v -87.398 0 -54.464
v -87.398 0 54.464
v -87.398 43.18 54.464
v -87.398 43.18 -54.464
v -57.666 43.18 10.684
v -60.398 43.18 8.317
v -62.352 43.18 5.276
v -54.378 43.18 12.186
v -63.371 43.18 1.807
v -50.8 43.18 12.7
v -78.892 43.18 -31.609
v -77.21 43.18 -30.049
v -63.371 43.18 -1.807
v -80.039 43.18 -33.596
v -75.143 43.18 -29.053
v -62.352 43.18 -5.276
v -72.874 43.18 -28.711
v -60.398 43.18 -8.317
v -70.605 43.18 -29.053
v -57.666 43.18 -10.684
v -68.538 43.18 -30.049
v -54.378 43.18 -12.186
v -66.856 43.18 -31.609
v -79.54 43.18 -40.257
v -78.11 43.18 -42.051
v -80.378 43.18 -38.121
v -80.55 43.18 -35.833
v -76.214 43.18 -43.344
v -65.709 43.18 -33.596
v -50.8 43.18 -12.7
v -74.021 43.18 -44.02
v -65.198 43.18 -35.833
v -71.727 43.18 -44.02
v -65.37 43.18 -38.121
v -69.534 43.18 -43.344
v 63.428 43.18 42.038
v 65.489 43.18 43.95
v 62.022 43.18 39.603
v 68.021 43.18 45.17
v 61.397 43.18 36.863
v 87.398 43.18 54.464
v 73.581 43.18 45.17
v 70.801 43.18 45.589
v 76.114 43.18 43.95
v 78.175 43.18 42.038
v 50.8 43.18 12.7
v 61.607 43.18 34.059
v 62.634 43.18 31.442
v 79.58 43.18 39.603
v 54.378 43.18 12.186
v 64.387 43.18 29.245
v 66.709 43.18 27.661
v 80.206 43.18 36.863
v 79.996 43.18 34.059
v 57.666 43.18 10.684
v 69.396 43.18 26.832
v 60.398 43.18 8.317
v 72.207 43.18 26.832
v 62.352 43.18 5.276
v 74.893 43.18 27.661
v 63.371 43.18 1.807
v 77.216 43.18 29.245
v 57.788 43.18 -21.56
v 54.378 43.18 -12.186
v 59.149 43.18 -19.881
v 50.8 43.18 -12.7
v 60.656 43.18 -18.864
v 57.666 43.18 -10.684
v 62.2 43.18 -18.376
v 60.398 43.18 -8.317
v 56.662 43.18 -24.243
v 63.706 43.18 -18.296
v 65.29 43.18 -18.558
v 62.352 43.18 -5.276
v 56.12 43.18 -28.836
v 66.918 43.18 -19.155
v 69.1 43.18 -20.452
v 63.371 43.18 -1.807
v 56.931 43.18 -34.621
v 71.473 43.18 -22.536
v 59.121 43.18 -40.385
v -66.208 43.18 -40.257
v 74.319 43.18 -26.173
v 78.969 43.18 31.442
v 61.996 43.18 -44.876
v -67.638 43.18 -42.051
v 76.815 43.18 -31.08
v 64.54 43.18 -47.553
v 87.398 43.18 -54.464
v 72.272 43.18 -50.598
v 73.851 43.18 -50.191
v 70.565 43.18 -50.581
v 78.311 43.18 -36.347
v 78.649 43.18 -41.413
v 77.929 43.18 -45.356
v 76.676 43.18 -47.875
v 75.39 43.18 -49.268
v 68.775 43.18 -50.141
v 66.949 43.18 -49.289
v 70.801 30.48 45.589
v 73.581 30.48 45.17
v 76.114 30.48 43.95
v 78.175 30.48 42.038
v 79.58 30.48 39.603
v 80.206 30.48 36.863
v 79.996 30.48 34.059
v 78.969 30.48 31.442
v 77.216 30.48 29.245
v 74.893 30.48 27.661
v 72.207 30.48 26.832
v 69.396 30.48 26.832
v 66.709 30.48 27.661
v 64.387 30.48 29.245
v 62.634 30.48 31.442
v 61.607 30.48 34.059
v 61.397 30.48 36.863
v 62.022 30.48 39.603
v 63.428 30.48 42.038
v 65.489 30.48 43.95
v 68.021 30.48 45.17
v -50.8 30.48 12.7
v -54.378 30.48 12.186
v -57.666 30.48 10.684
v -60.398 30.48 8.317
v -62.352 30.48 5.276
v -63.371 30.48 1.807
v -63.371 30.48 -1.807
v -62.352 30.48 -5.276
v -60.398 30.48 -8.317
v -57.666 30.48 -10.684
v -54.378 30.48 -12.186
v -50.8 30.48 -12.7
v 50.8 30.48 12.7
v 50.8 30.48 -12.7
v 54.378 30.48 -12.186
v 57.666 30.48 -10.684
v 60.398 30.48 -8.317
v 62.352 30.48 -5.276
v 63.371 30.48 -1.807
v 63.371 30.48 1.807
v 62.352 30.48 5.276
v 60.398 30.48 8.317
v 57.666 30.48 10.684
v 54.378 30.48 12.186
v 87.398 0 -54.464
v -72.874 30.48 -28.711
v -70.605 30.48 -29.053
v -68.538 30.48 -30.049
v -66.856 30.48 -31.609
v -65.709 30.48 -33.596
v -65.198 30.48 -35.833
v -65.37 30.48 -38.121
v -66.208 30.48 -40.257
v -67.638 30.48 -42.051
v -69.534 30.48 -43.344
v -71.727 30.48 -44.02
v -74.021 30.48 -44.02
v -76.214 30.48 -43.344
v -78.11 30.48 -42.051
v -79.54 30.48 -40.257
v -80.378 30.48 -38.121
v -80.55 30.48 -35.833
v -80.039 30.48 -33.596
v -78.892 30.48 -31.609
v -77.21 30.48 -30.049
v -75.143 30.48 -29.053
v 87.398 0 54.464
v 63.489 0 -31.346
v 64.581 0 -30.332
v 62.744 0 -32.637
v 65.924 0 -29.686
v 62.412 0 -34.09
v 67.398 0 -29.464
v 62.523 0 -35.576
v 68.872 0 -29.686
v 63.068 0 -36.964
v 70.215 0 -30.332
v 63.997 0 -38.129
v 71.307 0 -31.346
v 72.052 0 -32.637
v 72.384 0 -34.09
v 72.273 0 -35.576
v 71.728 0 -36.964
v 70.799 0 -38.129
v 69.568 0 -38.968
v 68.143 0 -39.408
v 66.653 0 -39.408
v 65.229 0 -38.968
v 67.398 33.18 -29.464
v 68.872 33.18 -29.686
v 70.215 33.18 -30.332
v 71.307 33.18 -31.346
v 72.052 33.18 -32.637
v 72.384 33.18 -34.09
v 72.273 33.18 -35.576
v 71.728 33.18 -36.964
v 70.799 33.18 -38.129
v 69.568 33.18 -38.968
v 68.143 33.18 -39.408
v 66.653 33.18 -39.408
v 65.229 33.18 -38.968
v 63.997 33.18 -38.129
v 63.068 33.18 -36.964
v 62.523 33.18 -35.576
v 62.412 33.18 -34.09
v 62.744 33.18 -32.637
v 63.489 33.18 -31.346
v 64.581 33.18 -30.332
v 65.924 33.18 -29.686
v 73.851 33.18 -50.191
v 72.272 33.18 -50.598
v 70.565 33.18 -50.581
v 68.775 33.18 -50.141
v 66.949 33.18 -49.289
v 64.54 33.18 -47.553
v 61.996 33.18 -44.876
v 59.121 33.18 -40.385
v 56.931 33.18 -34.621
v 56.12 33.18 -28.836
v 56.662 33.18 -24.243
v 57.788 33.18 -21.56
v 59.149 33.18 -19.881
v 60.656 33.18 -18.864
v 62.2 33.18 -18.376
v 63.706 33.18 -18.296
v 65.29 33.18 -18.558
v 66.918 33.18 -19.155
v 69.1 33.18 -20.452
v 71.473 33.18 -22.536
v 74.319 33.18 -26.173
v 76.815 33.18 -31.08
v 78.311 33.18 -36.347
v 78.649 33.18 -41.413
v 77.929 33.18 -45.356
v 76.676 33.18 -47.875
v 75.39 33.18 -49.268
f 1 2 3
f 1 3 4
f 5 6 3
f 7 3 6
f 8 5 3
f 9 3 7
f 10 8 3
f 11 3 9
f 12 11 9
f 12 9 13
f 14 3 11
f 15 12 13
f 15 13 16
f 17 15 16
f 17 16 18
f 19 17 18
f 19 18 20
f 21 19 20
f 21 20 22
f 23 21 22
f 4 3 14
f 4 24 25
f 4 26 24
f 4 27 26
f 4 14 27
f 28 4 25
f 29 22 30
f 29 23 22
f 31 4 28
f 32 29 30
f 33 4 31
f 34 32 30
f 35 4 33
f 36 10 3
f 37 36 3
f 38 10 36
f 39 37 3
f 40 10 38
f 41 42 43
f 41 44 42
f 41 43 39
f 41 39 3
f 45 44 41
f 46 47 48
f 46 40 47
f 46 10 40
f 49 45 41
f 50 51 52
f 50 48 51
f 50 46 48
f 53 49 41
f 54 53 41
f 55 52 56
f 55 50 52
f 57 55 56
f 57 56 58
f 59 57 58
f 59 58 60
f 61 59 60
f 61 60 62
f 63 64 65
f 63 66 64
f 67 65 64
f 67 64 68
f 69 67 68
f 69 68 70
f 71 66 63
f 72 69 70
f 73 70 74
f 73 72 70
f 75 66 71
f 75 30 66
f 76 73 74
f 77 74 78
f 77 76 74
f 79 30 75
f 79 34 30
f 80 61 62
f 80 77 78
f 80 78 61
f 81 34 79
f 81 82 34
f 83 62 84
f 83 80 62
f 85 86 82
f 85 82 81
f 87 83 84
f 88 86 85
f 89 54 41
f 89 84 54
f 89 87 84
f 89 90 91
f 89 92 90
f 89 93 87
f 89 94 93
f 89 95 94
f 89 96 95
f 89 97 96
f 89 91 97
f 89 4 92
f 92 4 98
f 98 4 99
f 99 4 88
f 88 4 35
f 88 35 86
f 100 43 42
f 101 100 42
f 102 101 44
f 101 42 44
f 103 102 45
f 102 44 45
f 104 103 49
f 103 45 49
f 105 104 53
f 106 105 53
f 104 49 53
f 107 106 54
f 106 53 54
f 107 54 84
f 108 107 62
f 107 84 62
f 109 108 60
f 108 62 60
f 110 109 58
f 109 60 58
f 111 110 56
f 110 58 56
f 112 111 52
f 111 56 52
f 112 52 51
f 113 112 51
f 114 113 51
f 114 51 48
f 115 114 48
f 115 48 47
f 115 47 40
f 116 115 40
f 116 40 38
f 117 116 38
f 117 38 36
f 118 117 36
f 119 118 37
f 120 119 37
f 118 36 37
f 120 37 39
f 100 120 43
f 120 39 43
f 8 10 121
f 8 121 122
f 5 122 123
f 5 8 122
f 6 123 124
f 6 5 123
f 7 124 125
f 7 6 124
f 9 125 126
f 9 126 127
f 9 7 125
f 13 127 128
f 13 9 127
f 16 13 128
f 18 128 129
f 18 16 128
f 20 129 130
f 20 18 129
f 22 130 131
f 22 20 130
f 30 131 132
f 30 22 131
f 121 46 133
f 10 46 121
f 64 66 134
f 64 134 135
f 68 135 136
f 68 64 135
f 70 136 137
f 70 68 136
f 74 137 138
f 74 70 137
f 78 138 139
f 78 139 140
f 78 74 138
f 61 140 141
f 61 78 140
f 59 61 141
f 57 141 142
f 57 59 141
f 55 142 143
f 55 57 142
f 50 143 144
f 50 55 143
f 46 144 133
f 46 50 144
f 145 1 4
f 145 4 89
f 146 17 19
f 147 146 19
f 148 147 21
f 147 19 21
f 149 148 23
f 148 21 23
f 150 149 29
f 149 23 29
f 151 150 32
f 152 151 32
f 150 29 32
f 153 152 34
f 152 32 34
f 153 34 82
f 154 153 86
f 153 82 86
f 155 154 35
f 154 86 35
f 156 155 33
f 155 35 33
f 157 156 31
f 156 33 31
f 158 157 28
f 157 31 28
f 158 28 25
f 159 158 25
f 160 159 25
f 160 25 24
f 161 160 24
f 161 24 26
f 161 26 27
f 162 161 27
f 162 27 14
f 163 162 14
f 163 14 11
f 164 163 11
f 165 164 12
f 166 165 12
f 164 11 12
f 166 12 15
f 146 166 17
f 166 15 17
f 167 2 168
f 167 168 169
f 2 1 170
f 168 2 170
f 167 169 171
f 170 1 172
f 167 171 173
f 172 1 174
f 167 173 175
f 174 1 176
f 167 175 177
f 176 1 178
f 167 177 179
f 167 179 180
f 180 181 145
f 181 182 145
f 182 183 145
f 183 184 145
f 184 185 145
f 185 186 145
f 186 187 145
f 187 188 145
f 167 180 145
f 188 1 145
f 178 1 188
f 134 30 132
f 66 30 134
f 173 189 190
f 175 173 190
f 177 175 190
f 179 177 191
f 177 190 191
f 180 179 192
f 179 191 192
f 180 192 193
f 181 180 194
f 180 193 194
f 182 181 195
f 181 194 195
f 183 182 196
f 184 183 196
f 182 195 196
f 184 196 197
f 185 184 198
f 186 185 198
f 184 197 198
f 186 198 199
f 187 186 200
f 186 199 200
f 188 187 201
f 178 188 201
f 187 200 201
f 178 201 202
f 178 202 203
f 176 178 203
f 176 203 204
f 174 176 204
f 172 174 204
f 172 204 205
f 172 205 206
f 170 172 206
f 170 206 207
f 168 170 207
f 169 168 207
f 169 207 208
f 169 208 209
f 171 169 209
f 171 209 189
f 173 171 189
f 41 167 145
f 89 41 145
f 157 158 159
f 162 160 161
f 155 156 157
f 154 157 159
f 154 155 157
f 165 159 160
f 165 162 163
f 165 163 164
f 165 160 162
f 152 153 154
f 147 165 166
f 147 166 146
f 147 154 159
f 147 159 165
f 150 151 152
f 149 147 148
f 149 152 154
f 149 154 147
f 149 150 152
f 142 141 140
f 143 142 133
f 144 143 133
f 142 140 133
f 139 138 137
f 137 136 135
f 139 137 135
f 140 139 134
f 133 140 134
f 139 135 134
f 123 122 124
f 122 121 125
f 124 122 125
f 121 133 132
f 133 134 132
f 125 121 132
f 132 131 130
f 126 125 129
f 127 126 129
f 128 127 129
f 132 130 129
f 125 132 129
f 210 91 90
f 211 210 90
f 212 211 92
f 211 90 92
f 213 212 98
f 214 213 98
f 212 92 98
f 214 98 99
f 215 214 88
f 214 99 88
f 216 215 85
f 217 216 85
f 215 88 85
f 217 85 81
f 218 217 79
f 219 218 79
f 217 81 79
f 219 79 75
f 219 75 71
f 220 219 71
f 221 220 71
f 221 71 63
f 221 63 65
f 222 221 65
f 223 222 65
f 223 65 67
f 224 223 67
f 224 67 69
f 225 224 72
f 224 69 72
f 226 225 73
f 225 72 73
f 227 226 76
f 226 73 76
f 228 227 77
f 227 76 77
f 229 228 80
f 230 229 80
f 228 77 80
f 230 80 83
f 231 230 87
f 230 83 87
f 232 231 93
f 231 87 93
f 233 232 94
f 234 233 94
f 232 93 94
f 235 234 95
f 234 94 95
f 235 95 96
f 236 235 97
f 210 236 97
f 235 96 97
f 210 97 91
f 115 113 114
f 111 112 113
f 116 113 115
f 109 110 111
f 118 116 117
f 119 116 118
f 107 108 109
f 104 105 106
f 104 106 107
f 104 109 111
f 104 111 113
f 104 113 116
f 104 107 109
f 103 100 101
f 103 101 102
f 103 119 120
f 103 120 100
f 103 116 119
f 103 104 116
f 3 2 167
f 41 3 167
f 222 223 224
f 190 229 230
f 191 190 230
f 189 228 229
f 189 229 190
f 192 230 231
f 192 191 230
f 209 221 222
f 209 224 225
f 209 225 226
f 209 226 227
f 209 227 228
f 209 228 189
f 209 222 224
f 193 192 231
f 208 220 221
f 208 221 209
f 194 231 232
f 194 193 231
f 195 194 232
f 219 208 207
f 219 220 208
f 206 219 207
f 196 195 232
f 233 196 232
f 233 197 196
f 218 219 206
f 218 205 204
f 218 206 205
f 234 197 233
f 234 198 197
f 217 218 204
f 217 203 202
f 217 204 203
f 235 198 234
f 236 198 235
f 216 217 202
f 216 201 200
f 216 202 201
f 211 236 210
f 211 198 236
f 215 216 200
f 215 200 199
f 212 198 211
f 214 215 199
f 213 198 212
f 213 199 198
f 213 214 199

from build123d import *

# Parameters (mm, degrees)
SKETCH1_W           = 174.796166906
SKETCH1_H           = 108.92723011
BOSS_EXTRUDE1_DEPTH = 43.18
SKETCH2_R           = 7.697413188
SKETCH2_R_2         = 9.430807524
CUT_EXTRUDE1_DEPTH  = 12.7
SKETCH3_RX          = 17
SKETCH3_RY          = 10
CUT_EXTRUDE2_DEPTH  = 10
SKETCH4_R           = 5
CUT_EXTRUDE3_DEPTH  = 50


with BuildPart() as part:
    # Sketch1 → Boss-Extrude1 (new body)
    with BuildSketch(Plane(origin=(0, 0, 0), x_dir=(1, 0, 0), z_dir=(0, 1, 0))):
        Rectangle(SKETCH1_W, SKETCH1_H)
    extrude(amount=BOSS_EXTRUDE1_DEPTH)

    # Sketch2 → Cut-Extrude1 (cut)
    with BuildSketch(Plane(origin=(0, 43.18, 0), x_dir=(1, 0, 0), z_dir=(0, 1, 0))):
        with Locations(Location((-72.874036632, 36.40863105, 0), (0, 0, 270))):  # turned: the seam where the file's is
            Circle(SKETCH2_R)
        with Locations(Location((70.801263176, -36.157833353, 0), (0, 0, 270))):  # turned: the seam where the file's is
            Circle(SKETCH2_R_2)
        with BuildLine():
            Line((-50.8, 12.7), (50.8, 12.7))
            ThreePointArc((50.8, 12.7), (63.5, 0), (50.8, -12.7))
            Line((50.8, -12.7), (-50.8, -12.7))
            ThreePointArc((-50.8, -12.7), (-63.5, 0), (-50.8, 12.7))
        make_face()
    extrude(amount=-CUT_EXTRUDE1_DEPTH, mode=Mode.SUBTRACT)

    # Sketch3 → Cut-Extrude2 (cut)
    with BuildSketch(Plane(origin=(0, 43.18, 0), x_dir=(1, 0, 0), z_dir=(0, 1, 0))):
        with Locations(Location((67.398083453, 34.463615055), (0, 0, 67.693794945))):
            Ellipse(SKETCH3_RX, SKETCH3_RY)
    extrude(amount=-CUT_EXTRUDE2_DEPTH, mode=Mode.SUBTRACT)

    # Sketch4 → Cut-Extrude3 (cut)
    with BuildSketch(Plane(origin=(0, 33.18, 0), x_dir=(1, 0, 0), z_dir=(0, 1, 0))):
        with Locations(Location((67.398083453, 34.463615055, 0), (0, 0, 270))):  # turned: the seam where the file's is
            Circle(SKETCH4_R)
    extrude(amount=-CUT_EXTRUDE3_DEPTH, mode=Mode.SUBTRACT)


solid = part.part
